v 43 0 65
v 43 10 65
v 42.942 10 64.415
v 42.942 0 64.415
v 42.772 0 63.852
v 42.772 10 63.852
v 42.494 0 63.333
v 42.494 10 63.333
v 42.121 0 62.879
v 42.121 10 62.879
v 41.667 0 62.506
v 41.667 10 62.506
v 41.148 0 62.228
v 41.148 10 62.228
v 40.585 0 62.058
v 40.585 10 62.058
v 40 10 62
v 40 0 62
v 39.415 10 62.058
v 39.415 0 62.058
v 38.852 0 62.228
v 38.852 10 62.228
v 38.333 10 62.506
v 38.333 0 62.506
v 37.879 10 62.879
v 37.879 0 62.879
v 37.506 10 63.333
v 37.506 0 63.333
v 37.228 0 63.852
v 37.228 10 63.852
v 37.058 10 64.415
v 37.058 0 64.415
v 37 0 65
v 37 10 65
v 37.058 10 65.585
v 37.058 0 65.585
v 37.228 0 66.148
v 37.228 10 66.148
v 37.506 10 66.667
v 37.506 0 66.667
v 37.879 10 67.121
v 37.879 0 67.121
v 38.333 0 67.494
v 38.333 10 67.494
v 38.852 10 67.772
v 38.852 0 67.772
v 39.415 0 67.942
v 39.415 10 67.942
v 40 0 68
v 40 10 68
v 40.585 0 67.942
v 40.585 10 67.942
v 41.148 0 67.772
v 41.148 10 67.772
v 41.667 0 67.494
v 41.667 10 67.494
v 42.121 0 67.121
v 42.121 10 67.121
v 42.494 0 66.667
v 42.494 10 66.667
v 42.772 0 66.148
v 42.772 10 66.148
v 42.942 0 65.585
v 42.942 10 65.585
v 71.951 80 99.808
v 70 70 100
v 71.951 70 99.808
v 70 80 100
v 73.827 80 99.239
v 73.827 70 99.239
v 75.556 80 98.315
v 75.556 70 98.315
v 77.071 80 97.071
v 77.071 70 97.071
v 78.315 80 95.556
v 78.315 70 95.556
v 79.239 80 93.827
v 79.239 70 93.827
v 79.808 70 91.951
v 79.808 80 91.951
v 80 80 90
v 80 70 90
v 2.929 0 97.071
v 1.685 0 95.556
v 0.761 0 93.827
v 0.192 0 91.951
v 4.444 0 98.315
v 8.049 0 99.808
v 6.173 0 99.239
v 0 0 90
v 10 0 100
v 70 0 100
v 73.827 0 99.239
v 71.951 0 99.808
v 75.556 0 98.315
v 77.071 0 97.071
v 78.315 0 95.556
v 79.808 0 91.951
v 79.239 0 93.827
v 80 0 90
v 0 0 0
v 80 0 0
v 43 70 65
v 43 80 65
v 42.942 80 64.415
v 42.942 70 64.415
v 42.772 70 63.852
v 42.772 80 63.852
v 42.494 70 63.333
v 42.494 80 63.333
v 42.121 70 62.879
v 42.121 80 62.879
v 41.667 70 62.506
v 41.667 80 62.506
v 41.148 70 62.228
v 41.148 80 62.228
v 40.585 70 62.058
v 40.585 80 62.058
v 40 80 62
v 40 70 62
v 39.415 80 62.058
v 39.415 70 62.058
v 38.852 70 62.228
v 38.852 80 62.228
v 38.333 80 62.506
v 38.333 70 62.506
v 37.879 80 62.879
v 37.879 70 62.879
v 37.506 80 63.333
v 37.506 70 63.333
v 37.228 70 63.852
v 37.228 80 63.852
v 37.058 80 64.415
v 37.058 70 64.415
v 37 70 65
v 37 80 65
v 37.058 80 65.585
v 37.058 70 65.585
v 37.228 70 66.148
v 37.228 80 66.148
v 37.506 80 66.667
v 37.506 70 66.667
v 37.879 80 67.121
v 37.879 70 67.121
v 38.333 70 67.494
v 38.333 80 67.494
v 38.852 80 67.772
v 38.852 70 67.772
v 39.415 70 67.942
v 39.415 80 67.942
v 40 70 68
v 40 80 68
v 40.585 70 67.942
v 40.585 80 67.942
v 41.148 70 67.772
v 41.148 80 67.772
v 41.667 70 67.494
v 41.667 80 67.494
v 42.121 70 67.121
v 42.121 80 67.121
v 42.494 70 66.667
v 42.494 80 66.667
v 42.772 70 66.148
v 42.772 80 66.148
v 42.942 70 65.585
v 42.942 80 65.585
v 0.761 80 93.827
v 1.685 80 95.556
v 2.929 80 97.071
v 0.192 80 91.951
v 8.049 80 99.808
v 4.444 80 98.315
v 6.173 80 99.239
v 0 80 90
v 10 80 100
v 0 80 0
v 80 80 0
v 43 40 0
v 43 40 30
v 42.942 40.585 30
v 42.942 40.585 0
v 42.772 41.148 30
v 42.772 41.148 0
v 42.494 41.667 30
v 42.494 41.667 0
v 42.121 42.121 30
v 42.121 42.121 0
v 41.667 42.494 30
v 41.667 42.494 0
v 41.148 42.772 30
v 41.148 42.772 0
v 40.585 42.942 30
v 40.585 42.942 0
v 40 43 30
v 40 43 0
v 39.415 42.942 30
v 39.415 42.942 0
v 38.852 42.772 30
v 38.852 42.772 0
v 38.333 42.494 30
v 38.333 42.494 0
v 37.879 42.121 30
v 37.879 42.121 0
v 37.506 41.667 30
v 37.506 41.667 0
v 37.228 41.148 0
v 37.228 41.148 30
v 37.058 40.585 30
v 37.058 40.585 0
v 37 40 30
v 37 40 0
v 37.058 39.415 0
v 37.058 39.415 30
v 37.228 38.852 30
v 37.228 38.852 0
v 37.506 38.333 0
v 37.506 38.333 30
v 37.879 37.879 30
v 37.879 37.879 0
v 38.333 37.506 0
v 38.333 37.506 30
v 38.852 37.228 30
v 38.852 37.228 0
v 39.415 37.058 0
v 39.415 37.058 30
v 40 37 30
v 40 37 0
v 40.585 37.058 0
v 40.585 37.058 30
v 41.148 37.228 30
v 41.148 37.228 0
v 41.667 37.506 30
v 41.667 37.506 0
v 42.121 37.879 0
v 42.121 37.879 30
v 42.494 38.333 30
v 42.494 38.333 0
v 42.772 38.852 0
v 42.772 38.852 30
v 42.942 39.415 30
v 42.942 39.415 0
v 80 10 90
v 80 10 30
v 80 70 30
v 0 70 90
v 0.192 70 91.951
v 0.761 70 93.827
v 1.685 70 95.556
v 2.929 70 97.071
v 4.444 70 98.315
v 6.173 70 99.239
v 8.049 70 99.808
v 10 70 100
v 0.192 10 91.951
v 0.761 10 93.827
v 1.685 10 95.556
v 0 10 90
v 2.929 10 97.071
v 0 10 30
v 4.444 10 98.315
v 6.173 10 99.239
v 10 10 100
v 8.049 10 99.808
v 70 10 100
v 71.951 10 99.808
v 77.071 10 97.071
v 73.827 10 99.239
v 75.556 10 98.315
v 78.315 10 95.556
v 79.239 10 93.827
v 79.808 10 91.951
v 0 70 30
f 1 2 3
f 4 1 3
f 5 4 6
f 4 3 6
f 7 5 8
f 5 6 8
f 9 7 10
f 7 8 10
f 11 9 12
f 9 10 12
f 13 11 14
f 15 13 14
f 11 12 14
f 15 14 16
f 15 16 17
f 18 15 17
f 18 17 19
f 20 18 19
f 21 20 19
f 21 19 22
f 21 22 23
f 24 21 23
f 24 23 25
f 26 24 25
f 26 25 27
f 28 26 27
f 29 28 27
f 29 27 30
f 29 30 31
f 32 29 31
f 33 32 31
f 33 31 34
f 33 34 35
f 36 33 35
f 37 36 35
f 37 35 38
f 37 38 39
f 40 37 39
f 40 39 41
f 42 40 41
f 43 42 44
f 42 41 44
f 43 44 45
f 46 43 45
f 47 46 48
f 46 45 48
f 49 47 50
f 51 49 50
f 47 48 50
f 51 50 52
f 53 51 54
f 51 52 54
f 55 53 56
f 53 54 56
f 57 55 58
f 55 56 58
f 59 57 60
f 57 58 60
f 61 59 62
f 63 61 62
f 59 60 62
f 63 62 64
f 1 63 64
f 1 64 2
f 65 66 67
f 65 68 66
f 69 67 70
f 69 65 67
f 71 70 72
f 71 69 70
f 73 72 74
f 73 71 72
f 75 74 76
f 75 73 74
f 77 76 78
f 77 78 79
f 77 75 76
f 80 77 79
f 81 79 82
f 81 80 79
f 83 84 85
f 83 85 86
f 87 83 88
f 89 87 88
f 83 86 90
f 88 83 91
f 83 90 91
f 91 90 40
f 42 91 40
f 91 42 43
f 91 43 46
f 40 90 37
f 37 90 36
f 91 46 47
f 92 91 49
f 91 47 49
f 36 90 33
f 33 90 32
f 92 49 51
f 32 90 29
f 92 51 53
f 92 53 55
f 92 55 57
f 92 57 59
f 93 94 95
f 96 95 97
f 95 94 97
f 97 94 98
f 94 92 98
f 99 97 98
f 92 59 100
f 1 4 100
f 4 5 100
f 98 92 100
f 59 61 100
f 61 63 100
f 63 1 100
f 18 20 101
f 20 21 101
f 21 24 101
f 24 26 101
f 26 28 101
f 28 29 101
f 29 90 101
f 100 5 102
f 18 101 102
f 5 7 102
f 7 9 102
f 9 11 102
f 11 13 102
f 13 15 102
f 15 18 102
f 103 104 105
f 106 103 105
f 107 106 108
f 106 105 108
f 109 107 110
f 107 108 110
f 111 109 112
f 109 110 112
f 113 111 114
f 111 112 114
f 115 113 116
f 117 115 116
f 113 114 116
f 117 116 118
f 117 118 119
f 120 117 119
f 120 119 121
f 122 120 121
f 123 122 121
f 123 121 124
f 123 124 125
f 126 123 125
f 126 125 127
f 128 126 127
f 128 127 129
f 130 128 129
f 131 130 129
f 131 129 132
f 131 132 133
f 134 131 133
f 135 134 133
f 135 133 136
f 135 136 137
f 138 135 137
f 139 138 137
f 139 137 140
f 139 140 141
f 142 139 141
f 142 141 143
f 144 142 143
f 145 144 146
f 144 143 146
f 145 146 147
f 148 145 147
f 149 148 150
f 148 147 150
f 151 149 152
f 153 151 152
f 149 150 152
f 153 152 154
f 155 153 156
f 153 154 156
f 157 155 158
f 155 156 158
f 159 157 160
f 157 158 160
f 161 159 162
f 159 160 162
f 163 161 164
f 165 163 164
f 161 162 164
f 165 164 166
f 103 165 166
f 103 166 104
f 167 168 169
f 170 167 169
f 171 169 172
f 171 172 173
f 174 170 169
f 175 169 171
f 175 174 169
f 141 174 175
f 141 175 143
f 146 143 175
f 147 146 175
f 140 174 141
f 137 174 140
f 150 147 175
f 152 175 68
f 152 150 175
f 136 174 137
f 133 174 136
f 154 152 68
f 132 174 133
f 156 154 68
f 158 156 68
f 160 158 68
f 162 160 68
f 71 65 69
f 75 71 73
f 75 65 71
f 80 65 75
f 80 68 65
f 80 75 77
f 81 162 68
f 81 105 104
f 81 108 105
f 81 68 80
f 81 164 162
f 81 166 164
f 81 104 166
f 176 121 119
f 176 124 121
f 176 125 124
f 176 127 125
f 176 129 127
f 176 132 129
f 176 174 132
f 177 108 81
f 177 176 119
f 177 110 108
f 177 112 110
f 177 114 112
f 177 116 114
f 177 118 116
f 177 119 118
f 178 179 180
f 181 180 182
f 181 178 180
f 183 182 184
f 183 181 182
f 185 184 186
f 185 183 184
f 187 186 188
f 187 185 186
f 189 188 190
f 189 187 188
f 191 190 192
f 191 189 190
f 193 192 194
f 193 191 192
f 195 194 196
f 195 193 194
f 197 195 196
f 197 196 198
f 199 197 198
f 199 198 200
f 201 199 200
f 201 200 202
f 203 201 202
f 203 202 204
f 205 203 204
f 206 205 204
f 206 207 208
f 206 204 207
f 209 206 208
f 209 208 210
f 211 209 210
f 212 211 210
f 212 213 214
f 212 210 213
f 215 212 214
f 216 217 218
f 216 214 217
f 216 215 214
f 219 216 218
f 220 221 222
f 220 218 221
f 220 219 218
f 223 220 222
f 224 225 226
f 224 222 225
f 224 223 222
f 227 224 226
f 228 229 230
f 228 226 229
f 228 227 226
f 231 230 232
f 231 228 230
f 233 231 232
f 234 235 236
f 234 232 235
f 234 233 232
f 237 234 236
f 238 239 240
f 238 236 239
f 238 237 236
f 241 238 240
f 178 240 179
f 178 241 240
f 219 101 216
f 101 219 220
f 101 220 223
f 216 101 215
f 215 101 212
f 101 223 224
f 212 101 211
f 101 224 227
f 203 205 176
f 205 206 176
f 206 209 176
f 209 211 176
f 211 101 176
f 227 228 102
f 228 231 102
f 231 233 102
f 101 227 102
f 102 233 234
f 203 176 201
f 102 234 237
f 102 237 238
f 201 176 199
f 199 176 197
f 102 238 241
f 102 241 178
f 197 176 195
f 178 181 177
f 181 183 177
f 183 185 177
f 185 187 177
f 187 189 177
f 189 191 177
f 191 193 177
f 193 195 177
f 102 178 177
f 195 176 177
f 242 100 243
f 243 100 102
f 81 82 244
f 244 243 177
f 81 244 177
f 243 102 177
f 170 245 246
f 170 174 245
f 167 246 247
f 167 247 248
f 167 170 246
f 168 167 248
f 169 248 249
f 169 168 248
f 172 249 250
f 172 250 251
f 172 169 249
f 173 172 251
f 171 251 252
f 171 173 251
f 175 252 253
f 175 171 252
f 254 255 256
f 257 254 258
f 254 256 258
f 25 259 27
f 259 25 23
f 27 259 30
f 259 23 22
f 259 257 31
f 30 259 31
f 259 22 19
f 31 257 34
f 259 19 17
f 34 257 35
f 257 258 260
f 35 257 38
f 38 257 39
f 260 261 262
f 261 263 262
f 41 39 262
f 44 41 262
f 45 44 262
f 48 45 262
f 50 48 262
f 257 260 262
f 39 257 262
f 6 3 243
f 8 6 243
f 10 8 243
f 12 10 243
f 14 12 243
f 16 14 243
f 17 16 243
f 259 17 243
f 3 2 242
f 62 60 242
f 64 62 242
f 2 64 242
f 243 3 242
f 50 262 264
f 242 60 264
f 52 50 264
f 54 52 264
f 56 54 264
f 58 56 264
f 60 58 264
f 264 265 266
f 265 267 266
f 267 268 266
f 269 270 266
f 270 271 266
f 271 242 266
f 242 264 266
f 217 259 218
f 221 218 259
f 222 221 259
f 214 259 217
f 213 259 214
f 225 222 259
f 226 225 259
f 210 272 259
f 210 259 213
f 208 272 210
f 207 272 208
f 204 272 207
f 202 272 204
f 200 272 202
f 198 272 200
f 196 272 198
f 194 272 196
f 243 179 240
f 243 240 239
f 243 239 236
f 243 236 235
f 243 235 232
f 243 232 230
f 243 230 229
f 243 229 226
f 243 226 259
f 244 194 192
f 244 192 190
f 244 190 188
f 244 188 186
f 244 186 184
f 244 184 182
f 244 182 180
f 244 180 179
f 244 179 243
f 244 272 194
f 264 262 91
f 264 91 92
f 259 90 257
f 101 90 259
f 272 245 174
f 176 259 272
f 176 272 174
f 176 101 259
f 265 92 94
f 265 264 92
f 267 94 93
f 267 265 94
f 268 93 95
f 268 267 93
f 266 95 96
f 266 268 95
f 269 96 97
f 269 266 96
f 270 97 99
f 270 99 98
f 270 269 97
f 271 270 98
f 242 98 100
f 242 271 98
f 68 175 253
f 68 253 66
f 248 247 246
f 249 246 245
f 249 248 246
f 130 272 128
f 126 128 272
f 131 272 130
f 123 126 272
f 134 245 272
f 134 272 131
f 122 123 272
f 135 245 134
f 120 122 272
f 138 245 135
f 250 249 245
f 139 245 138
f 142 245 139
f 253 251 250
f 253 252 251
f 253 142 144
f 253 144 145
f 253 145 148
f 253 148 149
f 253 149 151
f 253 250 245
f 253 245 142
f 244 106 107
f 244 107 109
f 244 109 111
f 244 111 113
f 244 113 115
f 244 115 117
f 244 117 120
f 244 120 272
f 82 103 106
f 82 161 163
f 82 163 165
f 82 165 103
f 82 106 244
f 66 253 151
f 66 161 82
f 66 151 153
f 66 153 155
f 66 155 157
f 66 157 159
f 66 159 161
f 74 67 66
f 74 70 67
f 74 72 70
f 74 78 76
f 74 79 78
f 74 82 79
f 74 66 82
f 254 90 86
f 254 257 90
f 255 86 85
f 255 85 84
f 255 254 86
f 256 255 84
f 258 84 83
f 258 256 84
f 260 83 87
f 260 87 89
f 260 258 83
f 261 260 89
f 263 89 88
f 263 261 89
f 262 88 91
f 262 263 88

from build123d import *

# Parameters (mm, degrees)
SKETCH1_W               = 80
SKETCH1_H               = 80
SKETCH1_R               = 3
BOSS_EXTRUDE1_DEPTH     = 100
SKETCH2_W               = 80
SKETCH2_H               = 60
CUT_EXTRUDE1_DEPTH      = 70
SKETCH3_R               = 3
CUT_EXTRUDE2_DEPTH      = 1
CUT_EXTRUDE2_DEPTH_BACK = 81
FILLET1_R               = 10


with BuildPart() as part:
    # Sketch1 → Boss-Extrude1 (new body)
    with BuildSketch(Plane.XY):
        with Locations((40, 40)):
            Rectangle(SKETCH1_W, SKETCH1_H)
        with Locations((40, 40)):
            Circle(SKETCH1_R, mode=Mode.SUBTRACT)
    extrude(amount=BOSS_EXTRUDE1_DEPTH)

    # Sketch2 → Cut-Extrude1 (cut)
    with BuildSketch(Plane.XY.offset(100)):
        with Locations((40, 40)):
            Rectangle(SKETCH2_W, SKETCH2_H)
    extrude(amount=-CUT_EXTRUDE1_DEPTH, mode=Mode.SUBTRACT)

    # Sketch3 → Cut-Extrude2 (cut, two sides)
    with BuildSketch(Plane(origin=(0, 80, 0), x_dir=(1, 0, 0), z_dir=(0, 1, 0))) as cut_extrude2_sk:
        with Locations((40, -65)):
            Circle(SKETCH3_R)
    extrude(amount=CUT_EXTRUDE2_DEPTH, mode=Mode.SUBTRACT)
    extrude(cut_extrude2_sk.sketch, amount=-CUT_EXTRUDE2_DEPTH_BACK, mode=Mode.SUBTRACT)

    # Fillet1
    fillet1_edges = [part.edges().sort_by_distance(p)[0] for p in [
        (80, 5, 100),
        (80, 75, 100),
        (0, 5, 100),
        (0, 75, 100),
    ]]
    fillet(fillet1_edges, radius=FILLET1_R)


solid = part.part
